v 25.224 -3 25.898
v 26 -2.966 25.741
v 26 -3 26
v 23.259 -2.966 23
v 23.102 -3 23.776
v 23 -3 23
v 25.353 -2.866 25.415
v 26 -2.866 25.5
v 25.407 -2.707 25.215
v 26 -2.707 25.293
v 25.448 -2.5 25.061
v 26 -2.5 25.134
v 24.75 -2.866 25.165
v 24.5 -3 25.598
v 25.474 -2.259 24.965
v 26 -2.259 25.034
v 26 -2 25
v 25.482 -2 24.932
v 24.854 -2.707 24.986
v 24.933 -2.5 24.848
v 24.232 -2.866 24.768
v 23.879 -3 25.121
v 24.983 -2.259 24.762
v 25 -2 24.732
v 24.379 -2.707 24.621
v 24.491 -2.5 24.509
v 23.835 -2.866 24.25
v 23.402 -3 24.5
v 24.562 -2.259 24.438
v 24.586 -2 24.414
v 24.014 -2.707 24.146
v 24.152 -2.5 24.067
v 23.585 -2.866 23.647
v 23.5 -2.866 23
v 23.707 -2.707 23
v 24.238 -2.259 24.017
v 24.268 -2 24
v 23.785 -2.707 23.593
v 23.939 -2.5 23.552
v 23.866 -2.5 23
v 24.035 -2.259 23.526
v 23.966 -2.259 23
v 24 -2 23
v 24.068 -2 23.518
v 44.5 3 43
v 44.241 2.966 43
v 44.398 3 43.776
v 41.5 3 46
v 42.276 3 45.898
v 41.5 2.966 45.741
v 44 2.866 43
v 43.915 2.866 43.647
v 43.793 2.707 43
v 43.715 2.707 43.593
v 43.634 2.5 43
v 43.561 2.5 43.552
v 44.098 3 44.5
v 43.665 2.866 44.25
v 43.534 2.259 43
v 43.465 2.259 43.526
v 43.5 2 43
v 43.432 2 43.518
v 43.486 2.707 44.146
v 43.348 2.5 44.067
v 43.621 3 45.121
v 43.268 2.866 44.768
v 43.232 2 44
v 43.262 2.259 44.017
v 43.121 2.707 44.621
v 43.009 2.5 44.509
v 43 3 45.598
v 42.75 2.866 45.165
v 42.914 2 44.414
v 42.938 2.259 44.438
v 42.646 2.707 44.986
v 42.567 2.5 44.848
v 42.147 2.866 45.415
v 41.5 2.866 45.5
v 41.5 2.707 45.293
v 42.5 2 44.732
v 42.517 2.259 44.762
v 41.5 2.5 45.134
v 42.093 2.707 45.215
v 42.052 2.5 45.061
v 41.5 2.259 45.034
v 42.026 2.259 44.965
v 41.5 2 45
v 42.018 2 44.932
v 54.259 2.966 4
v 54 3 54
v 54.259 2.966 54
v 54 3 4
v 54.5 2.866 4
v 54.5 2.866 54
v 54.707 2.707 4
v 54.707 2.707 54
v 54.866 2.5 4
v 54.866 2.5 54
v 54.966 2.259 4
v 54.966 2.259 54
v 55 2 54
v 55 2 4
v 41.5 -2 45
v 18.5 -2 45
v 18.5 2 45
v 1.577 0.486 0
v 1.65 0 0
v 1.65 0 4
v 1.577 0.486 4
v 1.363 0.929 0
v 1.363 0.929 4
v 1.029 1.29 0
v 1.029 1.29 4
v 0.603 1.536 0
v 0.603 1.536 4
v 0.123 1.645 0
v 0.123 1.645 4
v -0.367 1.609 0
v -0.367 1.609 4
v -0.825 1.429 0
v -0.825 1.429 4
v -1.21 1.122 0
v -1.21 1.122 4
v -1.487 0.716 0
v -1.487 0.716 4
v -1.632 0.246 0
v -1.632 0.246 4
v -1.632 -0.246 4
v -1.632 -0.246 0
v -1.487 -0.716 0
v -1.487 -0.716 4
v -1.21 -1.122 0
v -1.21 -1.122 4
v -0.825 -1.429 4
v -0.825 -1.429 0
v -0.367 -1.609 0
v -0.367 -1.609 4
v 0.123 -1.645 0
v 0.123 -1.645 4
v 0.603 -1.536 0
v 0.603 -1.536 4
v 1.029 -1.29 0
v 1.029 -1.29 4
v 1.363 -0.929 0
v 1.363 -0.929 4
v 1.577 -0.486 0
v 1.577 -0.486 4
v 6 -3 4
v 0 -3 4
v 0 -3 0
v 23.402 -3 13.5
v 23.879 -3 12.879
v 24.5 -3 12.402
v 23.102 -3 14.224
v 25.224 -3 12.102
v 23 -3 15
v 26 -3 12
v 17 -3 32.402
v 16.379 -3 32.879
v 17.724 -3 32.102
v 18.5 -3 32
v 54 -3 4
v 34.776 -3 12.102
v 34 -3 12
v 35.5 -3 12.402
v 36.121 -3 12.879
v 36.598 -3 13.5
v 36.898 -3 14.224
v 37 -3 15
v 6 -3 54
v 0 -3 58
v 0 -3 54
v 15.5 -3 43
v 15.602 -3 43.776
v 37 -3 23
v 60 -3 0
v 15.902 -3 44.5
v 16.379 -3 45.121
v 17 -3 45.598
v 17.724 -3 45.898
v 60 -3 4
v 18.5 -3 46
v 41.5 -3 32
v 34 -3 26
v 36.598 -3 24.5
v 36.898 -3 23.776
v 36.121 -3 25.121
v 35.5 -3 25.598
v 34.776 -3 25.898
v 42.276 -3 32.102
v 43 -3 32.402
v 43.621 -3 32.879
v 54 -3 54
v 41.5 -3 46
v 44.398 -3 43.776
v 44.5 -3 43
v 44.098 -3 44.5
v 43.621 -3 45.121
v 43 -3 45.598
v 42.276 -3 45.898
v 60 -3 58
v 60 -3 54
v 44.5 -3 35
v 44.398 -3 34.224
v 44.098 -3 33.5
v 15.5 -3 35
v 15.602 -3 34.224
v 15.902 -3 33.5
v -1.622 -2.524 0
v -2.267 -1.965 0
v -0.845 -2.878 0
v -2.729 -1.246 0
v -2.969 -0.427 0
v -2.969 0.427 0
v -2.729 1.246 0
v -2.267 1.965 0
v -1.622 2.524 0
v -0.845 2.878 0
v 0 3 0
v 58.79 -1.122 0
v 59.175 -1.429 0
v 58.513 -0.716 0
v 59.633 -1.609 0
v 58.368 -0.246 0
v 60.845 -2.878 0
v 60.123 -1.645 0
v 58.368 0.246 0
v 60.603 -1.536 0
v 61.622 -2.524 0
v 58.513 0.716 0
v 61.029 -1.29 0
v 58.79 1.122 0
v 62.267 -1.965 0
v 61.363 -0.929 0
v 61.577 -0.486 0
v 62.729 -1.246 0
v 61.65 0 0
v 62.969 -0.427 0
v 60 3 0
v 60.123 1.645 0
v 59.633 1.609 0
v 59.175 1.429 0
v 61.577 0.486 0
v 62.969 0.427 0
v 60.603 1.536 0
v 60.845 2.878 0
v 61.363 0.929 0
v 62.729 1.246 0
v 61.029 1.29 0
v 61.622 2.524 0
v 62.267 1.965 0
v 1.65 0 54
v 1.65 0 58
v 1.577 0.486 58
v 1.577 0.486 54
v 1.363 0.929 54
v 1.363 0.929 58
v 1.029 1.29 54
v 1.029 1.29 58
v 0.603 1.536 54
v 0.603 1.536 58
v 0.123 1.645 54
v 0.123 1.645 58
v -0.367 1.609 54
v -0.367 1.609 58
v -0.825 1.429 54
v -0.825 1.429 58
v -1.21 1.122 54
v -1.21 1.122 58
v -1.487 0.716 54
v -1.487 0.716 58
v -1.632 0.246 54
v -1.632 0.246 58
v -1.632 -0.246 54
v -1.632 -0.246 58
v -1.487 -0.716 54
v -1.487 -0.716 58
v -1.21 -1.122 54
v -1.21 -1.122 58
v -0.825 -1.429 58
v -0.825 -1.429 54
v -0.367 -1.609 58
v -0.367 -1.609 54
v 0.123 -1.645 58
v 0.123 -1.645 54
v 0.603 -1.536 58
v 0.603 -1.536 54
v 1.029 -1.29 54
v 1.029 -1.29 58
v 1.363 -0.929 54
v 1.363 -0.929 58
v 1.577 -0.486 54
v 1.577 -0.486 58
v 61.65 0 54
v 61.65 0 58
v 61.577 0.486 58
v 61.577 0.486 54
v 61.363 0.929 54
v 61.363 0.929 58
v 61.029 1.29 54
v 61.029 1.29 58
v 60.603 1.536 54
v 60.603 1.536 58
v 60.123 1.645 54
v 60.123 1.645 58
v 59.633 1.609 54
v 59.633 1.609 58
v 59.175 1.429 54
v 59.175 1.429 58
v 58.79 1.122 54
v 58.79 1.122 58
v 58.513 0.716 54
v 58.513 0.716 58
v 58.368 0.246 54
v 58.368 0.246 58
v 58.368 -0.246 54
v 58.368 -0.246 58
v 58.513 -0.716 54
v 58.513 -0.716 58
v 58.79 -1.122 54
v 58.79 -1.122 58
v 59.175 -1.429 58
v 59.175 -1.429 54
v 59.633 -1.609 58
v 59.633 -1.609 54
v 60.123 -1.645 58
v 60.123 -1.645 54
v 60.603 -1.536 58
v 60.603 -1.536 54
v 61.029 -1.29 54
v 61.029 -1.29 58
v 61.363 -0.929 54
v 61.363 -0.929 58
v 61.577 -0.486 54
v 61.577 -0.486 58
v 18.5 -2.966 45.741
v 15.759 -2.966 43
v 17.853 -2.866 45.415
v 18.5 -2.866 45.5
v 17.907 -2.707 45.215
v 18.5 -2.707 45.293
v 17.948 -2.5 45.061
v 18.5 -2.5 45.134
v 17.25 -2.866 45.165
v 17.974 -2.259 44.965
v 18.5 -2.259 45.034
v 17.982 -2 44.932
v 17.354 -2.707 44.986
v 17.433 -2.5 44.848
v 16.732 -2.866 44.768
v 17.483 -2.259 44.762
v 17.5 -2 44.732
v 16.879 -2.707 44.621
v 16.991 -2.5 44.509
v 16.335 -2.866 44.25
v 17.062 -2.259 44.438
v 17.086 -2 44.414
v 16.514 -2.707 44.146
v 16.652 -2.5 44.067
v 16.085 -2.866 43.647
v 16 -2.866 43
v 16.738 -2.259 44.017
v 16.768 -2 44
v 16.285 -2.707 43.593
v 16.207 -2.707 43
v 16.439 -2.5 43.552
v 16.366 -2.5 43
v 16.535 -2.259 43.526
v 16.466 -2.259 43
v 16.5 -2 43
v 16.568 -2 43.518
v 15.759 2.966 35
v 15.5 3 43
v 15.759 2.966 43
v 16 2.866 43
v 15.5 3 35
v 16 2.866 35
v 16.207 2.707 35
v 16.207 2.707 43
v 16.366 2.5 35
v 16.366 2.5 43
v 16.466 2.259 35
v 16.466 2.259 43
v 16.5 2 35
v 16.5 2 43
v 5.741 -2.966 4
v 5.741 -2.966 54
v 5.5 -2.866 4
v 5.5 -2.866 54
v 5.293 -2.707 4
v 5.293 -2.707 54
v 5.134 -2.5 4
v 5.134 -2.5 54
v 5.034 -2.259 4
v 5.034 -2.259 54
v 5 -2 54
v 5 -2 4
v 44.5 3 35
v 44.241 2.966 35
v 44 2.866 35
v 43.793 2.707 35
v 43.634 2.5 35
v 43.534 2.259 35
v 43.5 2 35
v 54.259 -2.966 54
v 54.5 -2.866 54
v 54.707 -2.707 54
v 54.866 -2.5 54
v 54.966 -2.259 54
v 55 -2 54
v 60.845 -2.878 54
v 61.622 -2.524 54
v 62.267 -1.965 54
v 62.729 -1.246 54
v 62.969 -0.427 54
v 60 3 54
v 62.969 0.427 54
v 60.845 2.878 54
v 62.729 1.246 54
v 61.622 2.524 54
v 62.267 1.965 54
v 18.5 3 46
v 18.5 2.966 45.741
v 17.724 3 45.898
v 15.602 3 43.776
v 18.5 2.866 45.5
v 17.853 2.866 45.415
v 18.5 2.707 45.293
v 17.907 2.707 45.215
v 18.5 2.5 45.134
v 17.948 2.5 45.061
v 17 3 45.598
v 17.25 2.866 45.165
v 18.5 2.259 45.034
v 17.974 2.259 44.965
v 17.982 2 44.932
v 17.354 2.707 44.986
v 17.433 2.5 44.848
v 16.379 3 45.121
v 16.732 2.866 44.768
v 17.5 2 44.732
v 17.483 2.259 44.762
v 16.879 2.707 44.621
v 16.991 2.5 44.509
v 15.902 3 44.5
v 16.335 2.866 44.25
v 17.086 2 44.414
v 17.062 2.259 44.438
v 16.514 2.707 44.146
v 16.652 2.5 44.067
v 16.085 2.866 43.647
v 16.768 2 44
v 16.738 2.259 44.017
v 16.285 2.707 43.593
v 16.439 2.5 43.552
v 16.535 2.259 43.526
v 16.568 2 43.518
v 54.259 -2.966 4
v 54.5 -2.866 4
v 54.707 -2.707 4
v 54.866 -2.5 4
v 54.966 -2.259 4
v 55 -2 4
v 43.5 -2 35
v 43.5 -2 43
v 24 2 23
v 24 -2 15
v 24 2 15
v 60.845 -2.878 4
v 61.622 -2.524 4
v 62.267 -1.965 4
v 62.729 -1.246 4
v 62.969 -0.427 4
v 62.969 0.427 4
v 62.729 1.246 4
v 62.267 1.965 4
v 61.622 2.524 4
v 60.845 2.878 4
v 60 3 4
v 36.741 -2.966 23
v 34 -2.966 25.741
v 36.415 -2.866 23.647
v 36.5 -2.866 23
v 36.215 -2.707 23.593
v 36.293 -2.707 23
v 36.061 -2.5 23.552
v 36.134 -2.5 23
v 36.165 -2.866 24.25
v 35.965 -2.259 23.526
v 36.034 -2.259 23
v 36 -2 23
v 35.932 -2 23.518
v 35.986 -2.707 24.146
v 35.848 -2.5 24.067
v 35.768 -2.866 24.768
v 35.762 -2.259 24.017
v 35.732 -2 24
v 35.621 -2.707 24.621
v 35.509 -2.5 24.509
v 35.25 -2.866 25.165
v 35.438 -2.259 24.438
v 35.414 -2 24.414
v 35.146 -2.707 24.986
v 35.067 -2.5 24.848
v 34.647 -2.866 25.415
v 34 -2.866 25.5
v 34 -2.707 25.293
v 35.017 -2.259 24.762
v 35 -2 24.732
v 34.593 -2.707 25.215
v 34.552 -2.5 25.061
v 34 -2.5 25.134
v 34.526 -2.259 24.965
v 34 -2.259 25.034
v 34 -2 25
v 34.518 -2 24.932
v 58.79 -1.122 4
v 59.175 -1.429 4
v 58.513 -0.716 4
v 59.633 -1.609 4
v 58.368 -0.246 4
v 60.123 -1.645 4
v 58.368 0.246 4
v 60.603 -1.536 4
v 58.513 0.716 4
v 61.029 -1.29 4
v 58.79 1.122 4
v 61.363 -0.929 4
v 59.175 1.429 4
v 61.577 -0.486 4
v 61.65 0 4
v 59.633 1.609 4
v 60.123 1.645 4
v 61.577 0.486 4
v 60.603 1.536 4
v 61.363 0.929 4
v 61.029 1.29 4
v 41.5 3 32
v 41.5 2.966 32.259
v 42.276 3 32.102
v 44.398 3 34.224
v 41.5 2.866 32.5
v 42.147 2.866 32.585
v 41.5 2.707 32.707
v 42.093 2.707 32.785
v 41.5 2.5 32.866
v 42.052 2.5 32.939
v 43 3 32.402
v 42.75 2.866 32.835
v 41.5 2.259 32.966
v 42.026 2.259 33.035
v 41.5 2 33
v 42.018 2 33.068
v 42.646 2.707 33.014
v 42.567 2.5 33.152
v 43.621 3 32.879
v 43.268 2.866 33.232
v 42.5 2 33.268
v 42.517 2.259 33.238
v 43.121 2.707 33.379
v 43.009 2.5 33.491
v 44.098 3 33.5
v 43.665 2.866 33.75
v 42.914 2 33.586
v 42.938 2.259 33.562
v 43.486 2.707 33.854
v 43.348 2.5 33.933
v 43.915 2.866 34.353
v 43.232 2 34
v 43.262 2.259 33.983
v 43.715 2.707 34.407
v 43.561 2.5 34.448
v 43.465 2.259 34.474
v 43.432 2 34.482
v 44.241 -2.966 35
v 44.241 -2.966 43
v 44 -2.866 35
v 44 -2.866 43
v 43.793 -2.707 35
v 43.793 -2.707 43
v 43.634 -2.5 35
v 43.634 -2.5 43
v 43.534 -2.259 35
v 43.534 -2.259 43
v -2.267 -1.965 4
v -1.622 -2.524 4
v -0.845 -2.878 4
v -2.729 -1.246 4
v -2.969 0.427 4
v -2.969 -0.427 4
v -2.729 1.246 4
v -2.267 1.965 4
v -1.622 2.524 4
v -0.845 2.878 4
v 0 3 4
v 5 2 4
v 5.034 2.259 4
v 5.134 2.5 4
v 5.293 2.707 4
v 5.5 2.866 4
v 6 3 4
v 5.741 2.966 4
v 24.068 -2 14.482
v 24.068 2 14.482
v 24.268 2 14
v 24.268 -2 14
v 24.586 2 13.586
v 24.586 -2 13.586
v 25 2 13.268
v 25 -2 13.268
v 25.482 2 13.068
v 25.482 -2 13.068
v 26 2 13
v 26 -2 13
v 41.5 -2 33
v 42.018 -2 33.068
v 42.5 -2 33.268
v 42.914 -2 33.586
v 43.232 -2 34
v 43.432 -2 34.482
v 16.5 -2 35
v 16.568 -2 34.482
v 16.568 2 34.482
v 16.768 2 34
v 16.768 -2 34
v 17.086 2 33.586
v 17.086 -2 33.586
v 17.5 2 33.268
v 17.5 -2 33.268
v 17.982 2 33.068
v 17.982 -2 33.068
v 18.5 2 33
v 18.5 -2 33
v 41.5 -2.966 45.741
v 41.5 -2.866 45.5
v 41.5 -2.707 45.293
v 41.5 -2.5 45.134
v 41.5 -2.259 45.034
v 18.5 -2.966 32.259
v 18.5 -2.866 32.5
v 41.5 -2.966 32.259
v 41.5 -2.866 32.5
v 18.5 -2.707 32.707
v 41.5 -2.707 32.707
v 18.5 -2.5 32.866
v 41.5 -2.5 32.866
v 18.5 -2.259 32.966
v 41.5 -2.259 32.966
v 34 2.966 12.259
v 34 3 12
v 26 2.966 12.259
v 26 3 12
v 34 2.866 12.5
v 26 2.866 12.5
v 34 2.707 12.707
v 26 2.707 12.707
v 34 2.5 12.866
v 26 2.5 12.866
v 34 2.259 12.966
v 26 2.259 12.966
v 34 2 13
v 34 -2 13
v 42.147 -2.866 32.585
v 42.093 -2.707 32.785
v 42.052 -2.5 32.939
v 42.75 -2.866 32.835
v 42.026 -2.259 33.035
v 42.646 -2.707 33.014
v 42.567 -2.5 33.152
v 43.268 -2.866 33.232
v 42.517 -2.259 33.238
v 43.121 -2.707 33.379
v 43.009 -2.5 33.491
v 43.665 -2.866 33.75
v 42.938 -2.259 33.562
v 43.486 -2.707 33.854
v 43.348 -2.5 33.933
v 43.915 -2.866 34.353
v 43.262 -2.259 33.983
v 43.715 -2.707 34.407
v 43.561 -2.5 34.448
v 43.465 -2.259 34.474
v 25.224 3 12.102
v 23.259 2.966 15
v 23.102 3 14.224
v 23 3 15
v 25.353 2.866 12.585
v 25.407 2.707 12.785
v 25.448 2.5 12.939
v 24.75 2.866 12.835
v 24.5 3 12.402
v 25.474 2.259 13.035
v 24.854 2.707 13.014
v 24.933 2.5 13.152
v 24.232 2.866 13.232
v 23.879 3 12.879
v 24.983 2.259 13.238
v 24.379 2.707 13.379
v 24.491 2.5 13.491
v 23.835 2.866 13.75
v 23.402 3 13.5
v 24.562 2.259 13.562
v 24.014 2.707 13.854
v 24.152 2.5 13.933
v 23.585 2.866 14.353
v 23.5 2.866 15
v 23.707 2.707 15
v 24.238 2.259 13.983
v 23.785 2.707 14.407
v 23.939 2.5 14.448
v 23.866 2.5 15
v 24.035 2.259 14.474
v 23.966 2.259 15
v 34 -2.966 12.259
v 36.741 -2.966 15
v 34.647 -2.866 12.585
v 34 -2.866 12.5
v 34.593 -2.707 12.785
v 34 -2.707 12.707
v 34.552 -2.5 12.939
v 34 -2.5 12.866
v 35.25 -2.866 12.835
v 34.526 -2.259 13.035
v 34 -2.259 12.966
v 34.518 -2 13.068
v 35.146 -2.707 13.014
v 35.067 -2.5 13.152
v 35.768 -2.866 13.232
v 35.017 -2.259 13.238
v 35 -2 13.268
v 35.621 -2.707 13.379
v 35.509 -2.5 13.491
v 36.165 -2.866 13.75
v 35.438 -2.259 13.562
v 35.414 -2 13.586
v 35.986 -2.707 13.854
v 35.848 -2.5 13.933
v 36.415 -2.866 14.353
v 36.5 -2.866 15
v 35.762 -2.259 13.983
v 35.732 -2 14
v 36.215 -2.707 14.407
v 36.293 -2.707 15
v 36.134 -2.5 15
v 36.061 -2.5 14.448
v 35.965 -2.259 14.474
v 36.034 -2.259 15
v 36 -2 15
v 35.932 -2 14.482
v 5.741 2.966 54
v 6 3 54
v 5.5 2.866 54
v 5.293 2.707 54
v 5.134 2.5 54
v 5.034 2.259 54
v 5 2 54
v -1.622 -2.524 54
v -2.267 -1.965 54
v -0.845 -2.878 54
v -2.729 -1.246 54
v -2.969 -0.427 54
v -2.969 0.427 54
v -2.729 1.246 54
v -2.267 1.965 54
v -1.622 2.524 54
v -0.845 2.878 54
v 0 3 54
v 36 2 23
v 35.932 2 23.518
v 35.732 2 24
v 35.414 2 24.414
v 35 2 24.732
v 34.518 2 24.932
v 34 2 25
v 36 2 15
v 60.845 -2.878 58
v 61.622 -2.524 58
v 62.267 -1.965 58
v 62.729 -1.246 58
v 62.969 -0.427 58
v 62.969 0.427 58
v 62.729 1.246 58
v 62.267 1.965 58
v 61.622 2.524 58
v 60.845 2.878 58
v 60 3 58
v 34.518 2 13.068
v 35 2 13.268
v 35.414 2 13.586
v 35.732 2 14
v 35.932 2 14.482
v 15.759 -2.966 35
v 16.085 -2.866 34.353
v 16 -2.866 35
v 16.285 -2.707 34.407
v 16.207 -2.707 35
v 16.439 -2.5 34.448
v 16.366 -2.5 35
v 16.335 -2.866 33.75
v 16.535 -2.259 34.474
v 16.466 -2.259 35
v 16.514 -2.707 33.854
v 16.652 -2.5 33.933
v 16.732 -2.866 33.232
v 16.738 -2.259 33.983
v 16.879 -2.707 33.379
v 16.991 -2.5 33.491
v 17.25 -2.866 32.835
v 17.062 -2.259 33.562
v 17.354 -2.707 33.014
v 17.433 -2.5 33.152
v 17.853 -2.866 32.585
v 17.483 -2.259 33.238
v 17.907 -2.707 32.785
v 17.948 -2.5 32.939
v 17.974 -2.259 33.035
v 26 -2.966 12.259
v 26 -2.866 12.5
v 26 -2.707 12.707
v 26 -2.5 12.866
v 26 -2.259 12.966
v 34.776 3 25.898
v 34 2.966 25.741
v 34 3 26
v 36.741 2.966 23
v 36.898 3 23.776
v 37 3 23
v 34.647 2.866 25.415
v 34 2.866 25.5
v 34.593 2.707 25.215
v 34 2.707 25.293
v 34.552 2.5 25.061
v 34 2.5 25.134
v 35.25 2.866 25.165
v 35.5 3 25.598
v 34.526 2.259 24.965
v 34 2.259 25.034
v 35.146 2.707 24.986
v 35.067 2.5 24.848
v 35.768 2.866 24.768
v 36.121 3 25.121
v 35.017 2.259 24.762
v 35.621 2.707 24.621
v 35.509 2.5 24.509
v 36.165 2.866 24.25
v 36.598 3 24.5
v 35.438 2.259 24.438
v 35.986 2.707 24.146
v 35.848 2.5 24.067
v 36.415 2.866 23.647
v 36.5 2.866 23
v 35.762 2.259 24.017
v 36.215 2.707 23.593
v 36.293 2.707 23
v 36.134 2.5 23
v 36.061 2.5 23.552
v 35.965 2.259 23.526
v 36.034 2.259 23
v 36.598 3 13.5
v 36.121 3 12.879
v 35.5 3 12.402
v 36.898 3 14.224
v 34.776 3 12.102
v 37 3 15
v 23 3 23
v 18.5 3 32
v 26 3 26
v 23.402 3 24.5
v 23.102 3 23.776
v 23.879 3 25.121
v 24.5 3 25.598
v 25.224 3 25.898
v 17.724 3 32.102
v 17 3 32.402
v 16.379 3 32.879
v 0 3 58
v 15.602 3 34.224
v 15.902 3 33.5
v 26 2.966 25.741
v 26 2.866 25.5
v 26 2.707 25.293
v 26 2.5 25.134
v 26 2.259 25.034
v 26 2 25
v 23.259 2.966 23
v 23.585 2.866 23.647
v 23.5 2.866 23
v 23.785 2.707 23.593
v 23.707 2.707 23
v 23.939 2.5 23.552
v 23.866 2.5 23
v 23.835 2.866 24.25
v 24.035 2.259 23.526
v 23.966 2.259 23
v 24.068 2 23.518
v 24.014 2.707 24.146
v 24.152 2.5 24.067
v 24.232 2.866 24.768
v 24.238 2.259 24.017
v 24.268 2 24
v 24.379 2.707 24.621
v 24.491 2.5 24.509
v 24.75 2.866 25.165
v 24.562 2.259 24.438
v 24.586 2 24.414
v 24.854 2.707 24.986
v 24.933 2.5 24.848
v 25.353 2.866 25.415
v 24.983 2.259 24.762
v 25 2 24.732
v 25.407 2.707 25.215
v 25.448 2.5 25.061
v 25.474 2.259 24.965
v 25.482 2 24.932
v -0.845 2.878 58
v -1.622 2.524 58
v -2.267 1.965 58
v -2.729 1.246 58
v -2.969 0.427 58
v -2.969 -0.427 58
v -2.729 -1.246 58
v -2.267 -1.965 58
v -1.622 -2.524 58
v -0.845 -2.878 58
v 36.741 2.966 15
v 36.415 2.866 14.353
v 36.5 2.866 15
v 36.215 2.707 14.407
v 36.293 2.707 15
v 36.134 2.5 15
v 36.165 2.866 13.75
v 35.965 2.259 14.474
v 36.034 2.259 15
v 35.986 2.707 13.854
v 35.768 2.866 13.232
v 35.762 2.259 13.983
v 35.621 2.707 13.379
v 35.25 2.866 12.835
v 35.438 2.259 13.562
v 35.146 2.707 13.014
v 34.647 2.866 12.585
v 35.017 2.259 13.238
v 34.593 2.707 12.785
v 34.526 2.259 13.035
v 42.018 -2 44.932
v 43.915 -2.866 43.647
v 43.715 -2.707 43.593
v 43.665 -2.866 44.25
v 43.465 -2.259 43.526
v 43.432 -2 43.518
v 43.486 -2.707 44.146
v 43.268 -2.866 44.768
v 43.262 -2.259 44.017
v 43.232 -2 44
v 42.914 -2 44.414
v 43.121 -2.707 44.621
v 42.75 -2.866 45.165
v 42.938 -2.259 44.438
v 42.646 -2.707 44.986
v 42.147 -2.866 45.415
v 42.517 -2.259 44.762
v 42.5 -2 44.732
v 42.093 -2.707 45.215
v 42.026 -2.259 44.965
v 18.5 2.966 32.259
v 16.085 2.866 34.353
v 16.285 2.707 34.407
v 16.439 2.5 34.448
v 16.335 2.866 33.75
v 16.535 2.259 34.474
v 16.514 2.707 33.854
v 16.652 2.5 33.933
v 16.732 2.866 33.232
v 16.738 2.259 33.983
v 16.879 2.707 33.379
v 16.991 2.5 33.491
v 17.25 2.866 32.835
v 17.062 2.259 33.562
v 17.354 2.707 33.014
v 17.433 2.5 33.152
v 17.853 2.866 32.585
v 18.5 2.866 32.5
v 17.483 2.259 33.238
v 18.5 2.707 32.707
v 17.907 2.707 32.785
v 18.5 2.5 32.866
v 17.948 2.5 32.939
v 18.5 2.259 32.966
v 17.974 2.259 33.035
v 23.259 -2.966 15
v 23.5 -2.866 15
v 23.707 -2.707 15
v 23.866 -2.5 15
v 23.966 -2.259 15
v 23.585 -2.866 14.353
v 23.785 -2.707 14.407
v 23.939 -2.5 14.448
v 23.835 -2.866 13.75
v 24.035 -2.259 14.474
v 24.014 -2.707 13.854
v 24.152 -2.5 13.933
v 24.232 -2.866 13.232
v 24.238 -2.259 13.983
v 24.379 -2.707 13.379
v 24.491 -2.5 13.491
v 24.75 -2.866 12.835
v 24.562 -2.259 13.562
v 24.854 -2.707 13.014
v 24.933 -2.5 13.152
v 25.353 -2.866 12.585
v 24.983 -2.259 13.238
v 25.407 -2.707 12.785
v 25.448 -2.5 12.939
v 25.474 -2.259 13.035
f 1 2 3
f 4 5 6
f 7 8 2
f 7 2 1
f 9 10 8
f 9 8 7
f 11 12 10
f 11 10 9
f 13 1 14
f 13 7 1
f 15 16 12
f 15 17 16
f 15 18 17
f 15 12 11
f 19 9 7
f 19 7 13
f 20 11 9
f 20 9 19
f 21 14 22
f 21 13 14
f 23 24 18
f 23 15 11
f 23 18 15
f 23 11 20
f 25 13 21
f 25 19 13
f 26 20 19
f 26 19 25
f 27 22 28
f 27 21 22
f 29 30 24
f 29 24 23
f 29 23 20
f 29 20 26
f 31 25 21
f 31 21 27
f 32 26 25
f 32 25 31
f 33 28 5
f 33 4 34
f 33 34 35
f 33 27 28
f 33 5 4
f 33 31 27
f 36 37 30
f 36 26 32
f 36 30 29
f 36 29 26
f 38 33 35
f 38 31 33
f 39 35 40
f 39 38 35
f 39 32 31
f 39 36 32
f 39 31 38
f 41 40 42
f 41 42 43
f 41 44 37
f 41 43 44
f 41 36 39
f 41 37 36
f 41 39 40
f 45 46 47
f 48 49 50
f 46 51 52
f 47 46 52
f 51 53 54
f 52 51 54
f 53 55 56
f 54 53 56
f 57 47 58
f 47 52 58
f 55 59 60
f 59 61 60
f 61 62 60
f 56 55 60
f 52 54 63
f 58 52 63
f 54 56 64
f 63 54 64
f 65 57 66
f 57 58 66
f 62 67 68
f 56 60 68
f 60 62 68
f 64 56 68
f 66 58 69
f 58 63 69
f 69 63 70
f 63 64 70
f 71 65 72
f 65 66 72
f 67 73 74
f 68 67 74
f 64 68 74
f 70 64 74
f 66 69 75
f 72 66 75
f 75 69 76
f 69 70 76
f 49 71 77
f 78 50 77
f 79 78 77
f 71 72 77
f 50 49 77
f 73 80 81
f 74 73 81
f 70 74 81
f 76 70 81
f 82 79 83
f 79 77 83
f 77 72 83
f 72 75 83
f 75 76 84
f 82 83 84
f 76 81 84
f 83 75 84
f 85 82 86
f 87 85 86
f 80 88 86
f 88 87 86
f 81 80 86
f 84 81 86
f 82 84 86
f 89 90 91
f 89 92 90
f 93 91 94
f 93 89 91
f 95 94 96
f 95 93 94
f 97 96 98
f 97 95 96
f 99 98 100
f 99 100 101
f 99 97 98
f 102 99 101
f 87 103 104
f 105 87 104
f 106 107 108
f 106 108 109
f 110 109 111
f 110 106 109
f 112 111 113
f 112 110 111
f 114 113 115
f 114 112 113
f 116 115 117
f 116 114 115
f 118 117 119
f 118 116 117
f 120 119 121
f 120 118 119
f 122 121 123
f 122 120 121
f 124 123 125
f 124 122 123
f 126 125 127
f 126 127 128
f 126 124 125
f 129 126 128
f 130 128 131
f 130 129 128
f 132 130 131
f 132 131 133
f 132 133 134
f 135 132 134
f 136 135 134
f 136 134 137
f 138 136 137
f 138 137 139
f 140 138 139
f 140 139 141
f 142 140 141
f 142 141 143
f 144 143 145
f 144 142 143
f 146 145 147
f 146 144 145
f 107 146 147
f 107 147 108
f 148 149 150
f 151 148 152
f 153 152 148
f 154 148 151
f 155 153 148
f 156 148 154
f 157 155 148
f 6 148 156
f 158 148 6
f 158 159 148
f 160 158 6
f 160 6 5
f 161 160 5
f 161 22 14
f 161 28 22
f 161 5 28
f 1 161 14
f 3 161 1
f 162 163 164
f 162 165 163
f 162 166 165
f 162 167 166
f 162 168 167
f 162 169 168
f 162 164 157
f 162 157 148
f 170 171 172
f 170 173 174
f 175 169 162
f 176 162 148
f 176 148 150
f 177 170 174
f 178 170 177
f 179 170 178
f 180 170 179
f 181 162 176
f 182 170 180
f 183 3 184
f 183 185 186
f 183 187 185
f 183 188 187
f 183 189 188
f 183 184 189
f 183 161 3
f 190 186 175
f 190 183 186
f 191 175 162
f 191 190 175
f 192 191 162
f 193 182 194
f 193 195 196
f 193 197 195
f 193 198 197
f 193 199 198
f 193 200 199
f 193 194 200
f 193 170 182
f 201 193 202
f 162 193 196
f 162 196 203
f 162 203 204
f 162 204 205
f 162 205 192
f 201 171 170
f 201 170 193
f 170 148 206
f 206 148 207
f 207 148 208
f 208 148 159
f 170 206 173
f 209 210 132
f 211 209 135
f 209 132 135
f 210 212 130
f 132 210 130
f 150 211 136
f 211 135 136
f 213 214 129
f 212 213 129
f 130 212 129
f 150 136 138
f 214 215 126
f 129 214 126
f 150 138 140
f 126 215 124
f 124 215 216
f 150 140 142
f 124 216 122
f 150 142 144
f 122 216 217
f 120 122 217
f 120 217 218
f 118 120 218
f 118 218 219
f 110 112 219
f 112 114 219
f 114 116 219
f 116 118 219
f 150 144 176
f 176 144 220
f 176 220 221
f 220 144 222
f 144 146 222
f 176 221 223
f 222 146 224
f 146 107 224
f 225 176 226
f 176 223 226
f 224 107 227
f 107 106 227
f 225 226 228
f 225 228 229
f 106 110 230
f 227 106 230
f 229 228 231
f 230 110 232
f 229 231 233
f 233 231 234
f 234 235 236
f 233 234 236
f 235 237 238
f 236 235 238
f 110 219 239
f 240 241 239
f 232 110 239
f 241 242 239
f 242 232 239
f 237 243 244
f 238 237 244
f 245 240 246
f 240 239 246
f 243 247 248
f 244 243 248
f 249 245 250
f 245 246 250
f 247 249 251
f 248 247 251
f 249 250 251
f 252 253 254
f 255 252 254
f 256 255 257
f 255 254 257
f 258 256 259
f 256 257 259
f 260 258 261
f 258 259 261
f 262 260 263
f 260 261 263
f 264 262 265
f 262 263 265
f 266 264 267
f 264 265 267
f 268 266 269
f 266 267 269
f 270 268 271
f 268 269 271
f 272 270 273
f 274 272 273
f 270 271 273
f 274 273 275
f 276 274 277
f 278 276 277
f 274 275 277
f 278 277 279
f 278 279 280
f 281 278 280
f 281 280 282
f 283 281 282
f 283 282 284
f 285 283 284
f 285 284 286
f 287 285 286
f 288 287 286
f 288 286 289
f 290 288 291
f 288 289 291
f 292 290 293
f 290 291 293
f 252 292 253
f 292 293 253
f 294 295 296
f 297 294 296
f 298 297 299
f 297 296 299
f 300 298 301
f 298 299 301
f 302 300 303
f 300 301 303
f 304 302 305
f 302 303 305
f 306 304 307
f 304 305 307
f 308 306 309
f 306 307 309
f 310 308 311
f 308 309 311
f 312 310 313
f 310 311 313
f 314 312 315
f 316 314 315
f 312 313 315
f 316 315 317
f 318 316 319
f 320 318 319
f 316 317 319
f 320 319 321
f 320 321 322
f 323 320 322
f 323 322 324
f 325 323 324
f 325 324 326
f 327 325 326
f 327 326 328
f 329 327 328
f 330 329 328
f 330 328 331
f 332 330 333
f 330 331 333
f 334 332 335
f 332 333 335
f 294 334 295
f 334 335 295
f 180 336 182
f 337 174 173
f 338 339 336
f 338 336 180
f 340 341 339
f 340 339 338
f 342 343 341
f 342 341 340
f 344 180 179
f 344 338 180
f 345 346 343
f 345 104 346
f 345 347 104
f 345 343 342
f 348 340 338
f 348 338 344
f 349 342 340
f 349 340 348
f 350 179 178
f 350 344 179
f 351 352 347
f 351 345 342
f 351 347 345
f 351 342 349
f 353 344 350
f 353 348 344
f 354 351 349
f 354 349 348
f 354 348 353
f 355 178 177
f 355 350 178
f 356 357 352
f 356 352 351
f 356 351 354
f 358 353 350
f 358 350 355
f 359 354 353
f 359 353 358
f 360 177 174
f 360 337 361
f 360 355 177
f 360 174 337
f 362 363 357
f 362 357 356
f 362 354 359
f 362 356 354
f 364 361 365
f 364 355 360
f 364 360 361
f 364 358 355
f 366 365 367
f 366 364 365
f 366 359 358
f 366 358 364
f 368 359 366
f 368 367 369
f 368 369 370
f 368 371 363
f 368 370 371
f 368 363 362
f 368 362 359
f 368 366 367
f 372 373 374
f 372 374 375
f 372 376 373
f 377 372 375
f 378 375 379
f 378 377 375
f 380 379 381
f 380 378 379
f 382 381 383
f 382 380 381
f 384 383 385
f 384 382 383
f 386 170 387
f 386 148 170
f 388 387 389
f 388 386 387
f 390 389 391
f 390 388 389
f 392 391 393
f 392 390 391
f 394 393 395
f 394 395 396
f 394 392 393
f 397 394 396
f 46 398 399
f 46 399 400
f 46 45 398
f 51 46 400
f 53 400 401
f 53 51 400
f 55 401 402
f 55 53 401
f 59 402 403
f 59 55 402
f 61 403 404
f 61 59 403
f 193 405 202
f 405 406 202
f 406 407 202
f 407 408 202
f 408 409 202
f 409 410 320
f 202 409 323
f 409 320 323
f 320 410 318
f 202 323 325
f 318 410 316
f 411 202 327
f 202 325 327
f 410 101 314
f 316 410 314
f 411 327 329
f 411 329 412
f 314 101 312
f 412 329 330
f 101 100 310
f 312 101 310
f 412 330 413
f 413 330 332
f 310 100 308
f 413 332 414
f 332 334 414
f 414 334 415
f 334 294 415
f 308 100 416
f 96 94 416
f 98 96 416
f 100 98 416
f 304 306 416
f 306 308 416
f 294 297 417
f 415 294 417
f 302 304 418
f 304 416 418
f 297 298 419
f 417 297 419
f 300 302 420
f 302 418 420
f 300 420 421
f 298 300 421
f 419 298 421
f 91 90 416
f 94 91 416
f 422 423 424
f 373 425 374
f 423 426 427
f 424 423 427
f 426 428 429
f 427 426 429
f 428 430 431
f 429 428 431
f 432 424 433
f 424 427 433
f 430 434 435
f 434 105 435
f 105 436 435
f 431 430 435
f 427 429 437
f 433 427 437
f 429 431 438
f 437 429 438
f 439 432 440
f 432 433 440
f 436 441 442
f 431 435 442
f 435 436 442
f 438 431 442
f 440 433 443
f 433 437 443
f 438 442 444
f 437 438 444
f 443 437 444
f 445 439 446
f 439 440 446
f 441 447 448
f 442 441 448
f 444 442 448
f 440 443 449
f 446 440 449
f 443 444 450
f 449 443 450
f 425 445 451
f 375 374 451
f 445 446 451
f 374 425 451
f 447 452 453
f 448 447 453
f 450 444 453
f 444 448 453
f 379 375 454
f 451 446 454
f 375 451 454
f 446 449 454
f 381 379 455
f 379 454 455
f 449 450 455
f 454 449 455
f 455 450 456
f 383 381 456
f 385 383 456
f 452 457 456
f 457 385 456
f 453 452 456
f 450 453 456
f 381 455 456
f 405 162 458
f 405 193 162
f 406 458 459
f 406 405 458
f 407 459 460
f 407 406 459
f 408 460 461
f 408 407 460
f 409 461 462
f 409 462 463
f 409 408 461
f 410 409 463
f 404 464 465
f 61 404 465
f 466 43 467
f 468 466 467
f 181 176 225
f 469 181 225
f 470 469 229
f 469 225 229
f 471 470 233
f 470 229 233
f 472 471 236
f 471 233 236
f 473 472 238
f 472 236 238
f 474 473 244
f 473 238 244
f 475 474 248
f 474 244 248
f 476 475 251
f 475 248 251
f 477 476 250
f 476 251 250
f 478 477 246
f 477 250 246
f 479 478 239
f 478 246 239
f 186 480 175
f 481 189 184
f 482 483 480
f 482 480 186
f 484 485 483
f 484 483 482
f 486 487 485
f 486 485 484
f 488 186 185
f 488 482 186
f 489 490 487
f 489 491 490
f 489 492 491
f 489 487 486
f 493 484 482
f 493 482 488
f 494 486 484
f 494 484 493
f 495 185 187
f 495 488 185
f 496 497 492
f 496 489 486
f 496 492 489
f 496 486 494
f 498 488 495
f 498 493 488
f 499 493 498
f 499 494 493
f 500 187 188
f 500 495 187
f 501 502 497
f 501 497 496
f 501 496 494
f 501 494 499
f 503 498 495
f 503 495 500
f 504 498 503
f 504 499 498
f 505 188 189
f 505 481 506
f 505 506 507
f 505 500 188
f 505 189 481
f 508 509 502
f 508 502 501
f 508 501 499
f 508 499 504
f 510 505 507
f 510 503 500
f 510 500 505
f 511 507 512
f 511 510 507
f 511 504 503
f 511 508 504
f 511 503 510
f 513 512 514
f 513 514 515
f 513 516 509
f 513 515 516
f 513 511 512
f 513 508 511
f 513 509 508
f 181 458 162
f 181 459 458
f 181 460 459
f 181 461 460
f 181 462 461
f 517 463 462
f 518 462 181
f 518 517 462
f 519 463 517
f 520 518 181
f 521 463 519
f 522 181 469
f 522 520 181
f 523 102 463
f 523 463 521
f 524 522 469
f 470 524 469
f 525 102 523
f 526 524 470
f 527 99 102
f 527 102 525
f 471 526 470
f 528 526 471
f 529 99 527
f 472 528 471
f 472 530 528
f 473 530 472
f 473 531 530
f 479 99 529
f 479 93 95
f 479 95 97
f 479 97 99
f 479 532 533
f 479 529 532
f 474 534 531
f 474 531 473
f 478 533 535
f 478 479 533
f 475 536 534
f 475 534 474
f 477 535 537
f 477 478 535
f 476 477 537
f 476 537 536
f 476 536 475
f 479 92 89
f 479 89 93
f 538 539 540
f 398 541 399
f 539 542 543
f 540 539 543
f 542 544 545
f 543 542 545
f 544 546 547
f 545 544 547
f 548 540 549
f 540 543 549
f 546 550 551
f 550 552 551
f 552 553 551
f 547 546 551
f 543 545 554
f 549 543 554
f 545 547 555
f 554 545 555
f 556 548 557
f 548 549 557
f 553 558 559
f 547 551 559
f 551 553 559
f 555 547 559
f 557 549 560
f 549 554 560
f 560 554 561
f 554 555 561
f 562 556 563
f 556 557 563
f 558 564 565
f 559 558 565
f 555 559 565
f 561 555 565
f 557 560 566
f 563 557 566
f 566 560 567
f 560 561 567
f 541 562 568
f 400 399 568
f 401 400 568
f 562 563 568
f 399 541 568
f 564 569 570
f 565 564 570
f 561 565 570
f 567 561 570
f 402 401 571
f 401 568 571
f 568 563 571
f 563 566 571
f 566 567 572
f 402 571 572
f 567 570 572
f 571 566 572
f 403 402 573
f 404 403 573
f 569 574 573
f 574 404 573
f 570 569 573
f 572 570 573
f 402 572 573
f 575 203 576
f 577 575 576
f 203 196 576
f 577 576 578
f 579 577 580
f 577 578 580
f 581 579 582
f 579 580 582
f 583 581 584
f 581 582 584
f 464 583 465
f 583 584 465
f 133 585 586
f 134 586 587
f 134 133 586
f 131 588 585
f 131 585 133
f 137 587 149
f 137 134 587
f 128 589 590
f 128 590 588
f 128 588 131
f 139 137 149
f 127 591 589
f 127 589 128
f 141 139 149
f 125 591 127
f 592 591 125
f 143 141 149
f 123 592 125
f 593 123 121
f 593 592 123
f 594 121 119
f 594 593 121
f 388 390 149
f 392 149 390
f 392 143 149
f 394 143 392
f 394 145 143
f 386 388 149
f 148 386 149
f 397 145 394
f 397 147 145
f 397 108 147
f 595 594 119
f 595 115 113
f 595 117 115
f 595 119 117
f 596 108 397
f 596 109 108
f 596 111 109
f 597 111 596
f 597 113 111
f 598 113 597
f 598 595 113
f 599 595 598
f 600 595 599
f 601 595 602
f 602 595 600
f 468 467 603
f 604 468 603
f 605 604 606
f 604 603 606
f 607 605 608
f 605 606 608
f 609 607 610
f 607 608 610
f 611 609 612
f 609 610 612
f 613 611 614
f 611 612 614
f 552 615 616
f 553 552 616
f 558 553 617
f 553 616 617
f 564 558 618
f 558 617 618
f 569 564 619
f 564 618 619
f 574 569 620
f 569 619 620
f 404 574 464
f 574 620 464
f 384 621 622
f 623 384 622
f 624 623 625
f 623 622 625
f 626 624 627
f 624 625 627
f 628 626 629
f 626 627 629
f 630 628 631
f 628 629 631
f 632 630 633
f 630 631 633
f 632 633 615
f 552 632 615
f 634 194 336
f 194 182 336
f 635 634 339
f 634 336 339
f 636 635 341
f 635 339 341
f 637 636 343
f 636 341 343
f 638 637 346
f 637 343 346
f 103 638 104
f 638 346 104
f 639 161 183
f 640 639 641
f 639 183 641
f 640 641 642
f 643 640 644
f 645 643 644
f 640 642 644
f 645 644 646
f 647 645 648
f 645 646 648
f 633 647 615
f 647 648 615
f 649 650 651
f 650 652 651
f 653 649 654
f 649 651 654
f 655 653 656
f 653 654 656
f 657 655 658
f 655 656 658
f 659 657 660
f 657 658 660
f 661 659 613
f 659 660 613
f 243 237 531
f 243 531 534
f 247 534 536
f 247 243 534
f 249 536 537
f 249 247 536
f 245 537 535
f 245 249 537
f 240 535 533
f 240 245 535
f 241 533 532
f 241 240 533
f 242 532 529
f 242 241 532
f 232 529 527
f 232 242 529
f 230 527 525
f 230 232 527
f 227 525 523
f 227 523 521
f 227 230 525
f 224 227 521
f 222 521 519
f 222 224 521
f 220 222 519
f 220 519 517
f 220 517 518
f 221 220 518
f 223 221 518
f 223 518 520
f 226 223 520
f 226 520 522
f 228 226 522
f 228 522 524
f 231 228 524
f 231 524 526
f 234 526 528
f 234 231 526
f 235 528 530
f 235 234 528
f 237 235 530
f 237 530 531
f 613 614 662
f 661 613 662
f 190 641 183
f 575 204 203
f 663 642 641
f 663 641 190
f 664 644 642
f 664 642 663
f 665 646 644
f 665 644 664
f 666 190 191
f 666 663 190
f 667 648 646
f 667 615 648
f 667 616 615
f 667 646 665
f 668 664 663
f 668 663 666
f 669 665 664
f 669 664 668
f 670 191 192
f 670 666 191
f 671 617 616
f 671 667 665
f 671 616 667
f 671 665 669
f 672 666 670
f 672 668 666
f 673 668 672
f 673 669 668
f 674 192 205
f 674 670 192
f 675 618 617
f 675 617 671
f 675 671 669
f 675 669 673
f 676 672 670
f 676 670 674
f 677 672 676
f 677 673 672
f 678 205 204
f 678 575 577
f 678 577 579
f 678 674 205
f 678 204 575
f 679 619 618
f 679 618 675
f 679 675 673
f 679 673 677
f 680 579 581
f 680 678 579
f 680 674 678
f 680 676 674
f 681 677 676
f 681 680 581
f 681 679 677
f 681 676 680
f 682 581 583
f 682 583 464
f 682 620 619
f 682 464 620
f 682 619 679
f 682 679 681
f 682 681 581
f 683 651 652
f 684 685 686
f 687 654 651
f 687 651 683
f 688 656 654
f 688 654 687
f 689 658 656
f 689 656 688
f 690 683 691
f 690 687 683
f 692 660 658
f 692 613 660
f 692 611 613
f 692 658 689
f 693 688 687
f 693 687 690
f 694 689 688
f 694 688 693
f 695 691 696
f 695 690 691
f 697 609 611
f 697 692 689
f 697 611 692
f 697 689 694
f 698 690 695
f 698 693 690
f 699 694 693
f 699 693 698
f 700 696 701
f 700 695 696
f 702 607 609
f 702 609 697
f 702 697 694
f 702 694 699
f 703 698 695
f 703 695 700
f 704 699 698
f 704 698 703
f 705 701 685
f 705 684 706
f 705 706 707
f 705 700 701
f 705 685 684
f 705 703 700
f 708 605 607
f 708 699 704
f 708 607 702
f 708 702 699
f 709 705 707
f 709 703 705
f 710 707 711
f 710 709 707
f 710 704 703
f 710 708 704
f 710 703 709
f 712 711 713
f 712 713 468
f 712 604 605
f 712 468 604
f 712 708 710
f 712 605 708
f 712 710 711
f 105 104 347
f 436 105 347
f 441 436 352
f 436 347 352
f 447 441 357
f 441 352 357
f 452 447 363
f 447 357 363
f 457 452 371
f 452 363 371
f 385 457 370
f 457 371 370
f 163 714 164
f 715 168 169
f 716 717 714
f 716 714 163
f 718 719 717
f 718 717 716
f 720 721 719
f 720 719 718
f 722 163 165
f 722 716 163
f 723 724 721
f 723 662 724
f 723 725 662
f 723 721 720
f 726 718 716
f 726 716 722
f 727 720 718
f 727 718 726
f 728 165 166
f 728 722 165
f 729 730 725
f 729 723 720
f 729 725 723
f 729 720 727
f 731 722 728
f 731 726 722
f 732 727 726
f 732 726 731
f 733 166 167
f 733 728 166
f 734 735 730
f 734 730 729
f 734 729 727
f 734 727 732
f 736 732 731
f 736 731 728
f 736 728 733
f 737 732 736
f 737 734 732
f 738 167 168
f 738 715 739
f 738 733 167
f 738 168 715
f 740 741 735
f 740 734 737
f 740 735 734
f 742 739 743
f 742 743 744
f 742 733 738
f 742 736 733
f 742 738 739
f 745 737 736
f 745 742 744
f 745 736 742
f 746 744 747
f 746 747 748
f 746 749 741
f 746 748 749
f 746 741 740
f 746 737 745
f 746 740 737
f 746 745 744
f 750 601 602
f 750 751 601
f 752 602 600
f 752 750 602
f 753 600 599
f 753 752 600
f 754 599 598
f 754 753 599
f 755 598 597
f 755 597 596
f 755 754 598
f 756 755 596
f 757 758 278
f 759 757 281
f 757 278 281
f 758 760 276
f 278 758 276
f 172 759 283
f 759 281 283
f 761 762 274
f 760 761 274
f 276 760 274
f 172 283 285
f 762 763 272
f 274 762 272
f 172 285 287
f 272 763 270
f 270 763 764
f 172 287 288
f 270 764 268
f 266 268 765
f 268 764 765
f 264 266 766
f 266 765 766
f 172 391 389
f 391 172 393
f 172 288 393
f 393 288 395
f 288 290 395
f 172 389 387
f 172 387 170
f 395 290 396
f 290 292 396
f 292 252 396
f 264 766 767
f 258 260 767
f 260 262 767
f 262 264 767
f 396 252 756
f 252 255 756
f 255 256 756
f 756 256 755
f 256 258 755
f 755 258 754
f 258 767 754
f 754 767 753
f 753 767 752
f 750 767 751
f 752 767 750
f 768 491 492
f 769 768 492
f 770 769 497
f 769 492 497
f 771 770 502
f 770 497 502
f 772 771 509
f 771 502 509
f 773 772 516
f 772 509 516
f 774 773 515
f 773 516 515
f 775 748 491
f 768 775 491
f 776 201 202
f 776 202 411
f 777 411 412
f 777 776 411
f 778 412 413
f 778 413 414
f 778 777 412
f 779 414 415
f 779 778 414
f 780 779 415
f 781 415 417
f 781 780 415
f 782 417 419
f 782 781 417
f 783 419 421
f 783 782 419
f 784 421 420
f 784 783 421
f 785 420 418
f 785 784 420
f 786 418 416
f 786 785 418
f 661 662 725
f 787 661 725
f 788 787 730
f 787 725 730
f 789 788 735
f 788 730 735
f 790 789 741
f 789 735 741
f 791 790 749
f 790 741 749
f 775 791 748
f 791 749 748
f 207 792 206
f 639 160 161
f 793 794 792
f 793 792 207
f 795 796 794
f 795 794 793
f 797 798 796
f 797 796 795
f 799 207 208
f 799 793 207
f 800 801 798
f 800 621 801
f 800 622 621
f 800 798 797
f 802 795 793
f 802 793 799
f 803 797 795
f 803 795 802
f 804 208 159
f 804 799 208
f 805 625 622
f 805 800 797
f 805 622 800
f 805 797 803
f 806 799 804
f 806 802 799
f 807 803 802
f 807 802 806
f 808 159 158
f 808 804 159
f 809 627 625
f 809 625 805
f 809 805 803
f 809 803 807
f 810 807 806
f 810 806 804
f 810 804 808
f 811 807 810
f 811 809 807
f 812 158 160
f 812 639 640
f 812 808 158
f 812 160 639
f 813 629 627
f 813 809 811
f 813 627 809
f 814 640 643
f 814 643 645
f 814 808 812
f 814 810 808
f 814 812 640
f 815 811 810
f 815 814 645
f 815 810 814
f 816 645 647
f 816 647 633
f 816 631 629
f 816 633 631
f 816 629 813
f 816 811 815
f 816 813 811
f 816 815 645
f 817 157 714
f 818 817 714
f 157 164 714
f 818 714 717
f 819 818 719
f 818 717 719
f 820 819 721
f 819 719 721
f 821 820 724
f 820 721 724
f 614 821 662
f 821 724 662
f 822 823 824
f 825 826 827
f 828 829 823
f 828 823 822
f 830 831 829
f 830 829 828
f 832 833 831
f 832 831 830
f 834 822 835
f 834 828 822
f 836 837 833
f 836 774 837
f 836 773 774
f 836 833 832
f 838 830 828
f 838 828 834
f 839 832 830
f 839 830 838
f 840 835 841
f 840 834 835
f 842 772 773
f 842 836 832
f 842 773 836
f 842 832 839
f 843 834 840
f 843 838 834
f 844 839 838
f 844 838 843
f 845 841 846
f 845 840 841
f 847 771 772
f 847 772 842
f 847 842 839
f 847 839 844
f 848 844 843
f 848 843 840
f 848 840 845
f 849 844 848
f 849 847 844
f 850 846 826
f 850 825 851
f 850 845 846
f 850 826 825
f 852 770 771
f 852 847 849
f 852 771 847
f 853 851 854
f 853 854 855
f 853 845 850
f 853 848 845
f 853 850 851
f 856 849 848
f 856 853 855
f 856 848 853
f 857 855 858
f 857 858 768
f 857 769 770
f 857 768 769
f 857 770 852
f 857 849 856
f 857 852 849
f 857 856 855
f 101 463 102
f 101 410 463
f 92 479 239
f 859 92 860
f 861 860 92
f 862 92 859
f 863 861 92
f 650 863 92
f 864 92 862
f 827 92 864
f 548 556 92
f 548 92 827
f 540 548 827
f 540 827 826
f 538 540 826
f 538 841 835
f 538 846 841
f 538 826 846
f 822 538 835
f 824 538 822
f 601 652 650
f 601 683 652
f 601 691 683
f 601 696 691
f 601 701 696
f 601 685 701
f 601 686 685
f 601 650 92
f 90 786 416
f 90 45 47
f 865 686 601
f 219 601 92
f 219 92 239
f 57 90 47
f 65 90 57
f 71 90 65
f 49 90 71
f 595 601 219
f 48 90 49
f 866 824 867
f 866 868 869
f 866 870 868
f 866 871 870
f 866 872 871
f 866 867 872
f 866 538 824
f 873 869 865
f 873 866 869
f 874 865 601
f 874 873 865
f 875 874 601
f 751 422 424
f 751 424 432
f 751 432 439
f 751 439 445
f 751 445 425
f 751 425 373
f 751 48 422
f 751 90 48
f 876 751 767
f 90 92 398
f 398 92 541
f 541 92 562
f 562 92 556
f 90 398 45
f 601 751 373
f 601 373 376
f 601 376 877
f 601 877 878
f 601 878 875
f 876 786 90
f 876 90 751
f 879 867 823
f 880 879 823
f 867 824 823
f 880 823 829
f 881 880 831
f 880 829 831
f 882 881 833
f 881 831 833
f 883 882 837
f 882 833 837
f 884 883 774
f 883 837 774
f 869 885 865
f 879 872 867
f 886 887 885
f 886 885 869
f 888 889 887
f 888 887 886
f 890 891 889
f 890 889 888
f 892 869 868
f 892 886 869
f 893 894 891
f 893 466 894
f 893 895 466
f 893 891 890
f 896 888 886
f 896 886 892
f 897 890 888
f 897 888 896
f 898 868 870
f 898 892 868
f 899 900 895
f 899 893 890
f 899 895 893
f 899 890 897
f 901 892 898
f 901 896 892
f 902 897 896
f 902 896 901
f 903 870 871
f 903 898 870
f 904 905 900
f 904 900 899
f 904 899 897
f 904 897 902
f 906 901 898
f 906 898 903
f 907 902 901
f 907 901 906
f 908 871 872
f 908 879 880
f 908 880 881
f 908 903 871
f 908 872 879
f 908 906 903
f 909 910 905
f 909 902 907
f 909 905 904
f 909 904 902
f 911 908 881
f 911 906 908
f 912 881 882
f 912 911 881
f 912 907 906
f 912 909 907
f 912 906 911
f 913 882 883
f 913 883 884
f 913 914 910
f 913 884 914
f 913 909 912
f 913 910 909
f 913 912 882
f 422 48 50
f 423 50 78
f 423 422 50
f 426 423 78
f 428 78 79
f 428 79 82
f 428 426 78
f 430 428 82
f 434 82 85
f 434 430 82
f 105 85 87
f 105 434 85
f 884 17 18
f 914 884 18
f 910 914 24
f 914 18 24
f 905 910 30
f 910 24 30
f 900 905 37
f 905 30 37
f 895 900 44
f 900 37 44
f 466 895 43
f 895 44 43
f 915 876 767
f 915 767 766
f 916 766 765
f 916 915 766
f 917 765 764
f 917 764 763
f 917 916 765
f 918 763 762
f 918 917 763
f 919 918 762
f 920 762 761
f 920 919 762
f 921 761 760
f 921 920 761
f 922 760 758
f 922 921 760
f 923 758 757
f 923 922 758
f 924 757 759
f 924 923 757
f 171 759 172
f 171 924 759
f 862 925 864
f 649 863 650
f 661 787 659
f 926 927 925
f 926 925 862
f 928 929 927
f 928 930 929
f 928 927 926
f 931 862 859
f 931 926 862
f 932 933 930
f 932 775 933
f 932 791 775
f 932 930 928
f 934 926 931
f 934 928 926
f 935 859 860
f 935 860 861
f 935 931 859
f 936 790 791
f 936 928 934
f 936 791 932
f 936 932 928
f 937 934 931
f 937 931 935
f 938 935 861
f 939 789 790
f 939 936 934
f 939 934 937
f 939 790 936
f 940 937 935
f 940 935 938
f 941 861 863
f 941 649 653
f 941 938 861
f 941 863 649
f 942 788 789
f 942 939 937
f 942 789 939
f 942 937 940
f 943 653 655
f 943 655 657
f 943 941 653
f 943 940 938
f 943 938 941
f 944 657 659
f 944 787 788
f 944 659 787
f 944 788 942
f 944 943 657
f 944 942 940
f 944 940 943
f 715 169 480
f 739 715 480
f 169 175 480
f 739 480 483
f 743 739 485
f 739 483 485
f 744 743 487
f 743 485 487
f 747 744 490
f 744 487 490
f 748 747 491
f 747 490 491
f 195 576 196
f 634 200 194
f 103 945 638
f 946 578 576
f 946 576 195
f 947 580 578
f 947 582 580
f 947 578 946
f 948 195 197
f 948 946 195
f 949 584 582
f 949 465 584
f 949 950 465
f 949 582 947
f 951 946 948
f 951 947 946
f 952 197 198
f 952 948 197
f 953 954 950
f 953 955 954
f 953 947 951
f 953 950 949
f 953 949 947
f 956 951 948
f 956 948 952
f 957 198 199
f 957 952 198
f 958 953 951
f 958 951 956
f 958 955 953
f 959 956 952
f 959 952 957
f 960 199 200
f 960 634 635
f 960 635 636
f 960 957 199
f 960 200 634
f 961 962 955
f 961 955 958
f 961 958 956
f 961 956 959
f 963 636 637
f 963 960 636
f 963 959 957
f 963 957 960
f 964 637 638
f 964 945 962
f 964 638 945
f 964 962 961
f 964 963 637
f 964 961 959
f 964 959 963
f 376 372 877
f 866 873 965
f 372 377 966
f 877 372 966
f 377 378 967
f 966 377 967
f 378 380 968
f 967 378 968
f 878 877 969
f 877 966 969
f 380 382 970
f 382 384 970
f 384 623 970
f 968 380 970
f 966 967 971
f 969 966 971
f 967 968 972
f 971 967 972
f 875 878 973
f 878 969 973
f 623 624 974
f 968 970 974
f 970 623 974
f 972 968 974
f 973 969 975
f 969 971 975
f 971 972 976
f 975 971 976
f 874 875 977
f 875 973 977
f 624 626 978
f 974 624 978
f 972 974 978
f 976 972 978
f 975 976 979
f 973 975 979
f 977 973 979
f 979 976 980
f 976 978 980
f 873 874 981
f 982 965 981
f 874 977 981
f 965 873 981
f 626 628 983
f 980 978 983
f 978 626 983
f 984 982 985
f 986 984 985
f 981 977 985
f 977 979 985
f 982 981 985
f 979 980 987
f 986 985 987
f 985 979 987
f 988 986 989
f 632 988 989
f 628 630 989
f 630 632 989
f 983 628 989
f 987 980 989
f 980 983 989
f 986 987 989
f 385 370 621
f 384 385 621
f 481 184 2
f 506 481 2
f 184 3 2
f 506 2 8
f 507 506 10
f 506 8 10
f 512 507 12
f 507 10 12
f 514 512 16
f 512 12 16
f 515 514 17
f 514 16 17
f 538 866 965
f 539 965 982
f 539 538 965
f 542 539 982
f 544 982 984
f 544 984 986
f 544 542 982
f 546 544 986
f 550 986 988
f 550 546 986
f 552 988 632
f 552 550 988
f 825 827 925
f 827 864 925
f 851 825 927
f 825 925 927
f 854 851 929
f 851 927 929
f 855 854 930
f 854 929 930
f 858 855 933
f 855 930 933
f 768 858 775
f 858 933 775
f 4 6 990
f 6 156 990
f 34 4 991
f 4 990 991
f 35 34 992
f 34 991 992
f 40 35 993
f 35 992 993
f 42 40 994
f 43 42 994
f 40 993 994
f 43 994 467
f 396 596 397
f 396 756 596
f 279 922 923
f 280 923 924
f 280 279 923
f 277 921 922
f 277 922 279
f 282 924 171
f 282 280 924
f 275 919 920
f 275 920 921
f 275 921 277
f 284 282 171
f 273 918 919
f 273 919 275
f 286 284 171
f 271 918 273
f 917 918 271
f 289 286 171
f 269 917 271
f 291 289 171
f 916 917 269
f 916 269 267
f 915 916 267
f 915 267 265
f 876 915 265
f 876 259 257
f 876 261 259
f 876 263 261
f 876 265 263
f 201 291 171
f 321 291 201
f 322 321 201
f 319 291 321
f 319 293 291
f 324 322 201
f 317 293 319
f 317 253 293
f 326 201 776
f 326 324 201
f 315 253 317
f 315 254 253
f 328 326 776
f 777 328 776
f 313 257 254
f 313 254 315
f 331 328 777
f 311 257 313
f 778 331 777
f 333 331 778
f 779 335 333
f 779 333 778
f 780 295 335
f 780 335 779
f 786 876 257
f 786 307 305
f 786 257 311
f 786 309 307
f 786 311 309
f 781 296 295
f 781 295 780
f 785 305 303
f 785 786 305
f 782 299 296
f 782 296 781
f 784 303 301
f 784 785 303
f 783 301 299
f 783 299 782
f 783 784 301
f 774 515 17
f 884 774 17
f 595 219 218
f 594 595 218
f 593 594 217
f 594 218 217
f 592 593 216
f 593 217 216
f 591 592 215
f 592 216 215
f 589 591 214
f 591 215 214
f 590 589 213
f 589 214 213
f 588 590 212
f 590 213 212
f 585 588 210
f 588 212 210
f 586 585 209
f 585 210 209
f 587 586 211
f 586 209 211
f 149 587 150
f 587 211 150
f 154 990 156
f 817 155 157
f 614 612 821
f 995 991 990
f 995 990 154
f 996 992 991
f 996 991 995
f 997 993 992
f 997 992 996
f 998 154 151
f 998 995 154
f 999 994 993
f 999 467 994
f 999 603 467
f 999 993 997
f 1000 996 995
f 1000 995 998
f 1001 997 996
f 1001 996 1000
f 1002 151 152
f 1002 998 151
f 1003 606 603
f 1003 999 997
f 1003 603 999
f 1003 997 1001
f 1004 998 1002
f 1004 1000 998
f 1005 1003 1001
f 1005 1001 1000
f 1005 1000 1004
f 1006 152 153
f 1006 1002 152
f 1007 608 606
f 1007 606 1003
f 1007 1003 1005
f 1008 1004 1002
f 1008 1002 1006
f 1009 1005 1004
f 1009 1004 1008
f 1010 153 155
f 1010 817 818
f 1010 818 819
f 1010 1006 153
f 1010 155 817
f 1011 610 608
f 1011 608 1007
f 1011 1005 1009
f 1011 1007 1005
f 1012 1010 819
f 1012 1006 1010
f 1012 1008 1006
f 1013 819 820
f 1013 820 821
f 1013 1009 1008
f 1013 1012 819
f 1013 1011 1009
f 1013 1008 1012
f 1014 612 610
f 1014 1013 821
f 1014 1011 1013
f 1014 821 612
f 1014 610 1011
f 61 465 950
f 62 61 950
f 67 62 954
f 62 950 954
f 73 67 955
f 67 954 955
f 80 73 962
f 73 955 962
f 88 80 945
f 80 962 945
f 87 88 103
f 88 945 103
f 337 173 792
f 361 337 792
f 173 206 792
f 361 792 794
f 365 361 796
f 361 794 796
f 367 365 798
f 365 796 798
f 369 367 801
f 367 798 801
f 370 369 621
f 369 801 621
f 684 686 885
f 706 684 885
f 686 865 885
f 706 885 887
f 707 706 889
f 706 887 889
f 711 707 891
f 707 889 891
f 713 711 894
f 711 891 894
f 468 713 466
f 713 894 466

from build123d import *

# Parameters (mm, degrees)
SKETCH1_R           = 1.65
BOSS_EXTRUDE1_DEPTH = 4
BOSS_EXTRUDE2_DEPTH = 25
CUT_EXTRUDE1_DEPTH  = 25
FILLET1_R           = 1


with BuildPart() as part:
    # Sketch1 → Boss-Extrude1 (new body)
    with BuildSketch(Plane.XY):
        with BuildLine():
            ThreePointArc((0, 3), (-3, 0), (0, -3))
            Line((0, -3), (60, -3))
            ThreePointArc((60, -3), (63, 0), (60, 3))
            Line((60, 3), (0, 3))
        make_face()
        Circle(SKETCH1_R, mode=Mode.SUBTRACT)
        with Locations((60, 0)):
            Circle(SKETCH1_R, mode=Mode.SUBTRACT)
    extrude(amount=BOSS_EXTRUDE1_DEPTH)

    # Sketch2 → Boss-Extrude2 (add)
    with BuildSketch(Plane.XY.offset(4)):
        Polygon((55, -2.5), (5, 2.5), (5, -3), (55, -3), align=None)
        Polygon((5, 3), (5, 2.5), (55, -2.5), (55, 3), align=None)
    extrude(amount=BOSS_EXTRUDE2_DEPTH)

    # Mirror1: part across plane


with BuildPart() as part_1:
    add(part.part)
    add(part.part.mirror(Plane.XY.offset(29)))

    # Sketch4 → Cut-Extrude1 (cut)
    with BuildSketch(Plane.XZ.offset(3)):
        with BuildLine():
            Line((16.5, 42.5), (26, 33))
            Line((26, 33), (41.5, 33))
            ThreePointArc((41.5, 33), (42.914213562, 33.585786438), (43.5, 35))
            Line((43.5, 35), (43.5, 43))
            ThreePointArc((43.5, 43), (42.914213562, 44.414213562), (41.5, 45))
            Line((41.5, 45), (18.5, 45))
            ThreePointArc((18.5, 45), (17.085786438, 44.414213562), (16.5, 43))
            Line((16.5, 43), (16.5, 42.5))
        make_face()
        with BuildLine():
            Line((18.5, 33), (26, 33))
            Line((26, 33), (16.5, 42.5))
            Line((16.5, 42.5), (16.5, 35))
            ThreePointArc((16.5, 35), (17.085786438, 33.585786438), (18.5, 33))
        make_face()
        with BuildLine():
            Line((36, 23), (34, 25))
            Line((34, 25), (26, 25))
            ThreePointArc((26, 25), (24.585786438, 24.414213562), (24, 23))
            Line((24, 23), (24, 15))
            ThreePointArc((24, 15), (24.585786438, 13.585786438), (26, 13))
            Line((26, 13), (34, 13))
            ThreePointArc((34, 13), (35.414213562, 13.585786438), (36, 15))
            Line((36, 15), (36, 23))
        make_face()
        with BuildLine():
            ThreePointArc((36, 23), (35.414213562, 24.414213562), (34, 25))
            Line((34, 25), (36, 23))
        make_face()
    extrude(amount=-CUT_EXTRUDE1_DEPTH, mode=Mode.SUBTRACT)

    # Fillet1
    fillet1_edges = [part_1.edges().sort_by_distance(p)[0] for p in [
        (24.585786438, -3, 13.585786438),
        (30, -3, 25),
        (36, -3, 19),
        (30, -3, 13),
        (35.414213562, -3, 13.585786438),
        (35.414213562, -3, 24.414213562),
        (24.585786438, -3, 24.414213562),
        (24, -3, 19),
        (55, -3, 29),
        (55, 3, 29),
        (5, 3, 29),
        (5, -3, 29),
        (30, 3, 13),
        (35.414213562, 3, 13.585786438),
        (36, 3, 19),
        (35.414213562, 3, 24.414213562),
        (30, 3, 25),
        (24.585786438, 3, 24.414213562),
        (24, 3, 19),
        (24.585786438, 3, 13.585786438),
        (17.085786438, 3, 44.414213562),
        (16.5, 3, 39),
        (17.085786438, 3, 33.585786438),
        (30, 3, 33),
        (42.914213562, 3, 33.585786438),
        (43.5, 3, 39),
        (42.914213562, 3, 44.414213562),
        (30, 3, 45),
        (30, -3, 45),
        (43.5, -3, 39),
        (42.914213562, -3, 33.585786438),
        (17.085786438, -3, 33.585786438),
        (17.085786438, -3, 44.414213562),
        (16.5, -3, 39),
        (30, -3, 33),
        (42.914213562, -3, 44.414213562),
    ]]
    fillet(fillet1_edges, radius=FILLET1_R)


solid = part_1.part
